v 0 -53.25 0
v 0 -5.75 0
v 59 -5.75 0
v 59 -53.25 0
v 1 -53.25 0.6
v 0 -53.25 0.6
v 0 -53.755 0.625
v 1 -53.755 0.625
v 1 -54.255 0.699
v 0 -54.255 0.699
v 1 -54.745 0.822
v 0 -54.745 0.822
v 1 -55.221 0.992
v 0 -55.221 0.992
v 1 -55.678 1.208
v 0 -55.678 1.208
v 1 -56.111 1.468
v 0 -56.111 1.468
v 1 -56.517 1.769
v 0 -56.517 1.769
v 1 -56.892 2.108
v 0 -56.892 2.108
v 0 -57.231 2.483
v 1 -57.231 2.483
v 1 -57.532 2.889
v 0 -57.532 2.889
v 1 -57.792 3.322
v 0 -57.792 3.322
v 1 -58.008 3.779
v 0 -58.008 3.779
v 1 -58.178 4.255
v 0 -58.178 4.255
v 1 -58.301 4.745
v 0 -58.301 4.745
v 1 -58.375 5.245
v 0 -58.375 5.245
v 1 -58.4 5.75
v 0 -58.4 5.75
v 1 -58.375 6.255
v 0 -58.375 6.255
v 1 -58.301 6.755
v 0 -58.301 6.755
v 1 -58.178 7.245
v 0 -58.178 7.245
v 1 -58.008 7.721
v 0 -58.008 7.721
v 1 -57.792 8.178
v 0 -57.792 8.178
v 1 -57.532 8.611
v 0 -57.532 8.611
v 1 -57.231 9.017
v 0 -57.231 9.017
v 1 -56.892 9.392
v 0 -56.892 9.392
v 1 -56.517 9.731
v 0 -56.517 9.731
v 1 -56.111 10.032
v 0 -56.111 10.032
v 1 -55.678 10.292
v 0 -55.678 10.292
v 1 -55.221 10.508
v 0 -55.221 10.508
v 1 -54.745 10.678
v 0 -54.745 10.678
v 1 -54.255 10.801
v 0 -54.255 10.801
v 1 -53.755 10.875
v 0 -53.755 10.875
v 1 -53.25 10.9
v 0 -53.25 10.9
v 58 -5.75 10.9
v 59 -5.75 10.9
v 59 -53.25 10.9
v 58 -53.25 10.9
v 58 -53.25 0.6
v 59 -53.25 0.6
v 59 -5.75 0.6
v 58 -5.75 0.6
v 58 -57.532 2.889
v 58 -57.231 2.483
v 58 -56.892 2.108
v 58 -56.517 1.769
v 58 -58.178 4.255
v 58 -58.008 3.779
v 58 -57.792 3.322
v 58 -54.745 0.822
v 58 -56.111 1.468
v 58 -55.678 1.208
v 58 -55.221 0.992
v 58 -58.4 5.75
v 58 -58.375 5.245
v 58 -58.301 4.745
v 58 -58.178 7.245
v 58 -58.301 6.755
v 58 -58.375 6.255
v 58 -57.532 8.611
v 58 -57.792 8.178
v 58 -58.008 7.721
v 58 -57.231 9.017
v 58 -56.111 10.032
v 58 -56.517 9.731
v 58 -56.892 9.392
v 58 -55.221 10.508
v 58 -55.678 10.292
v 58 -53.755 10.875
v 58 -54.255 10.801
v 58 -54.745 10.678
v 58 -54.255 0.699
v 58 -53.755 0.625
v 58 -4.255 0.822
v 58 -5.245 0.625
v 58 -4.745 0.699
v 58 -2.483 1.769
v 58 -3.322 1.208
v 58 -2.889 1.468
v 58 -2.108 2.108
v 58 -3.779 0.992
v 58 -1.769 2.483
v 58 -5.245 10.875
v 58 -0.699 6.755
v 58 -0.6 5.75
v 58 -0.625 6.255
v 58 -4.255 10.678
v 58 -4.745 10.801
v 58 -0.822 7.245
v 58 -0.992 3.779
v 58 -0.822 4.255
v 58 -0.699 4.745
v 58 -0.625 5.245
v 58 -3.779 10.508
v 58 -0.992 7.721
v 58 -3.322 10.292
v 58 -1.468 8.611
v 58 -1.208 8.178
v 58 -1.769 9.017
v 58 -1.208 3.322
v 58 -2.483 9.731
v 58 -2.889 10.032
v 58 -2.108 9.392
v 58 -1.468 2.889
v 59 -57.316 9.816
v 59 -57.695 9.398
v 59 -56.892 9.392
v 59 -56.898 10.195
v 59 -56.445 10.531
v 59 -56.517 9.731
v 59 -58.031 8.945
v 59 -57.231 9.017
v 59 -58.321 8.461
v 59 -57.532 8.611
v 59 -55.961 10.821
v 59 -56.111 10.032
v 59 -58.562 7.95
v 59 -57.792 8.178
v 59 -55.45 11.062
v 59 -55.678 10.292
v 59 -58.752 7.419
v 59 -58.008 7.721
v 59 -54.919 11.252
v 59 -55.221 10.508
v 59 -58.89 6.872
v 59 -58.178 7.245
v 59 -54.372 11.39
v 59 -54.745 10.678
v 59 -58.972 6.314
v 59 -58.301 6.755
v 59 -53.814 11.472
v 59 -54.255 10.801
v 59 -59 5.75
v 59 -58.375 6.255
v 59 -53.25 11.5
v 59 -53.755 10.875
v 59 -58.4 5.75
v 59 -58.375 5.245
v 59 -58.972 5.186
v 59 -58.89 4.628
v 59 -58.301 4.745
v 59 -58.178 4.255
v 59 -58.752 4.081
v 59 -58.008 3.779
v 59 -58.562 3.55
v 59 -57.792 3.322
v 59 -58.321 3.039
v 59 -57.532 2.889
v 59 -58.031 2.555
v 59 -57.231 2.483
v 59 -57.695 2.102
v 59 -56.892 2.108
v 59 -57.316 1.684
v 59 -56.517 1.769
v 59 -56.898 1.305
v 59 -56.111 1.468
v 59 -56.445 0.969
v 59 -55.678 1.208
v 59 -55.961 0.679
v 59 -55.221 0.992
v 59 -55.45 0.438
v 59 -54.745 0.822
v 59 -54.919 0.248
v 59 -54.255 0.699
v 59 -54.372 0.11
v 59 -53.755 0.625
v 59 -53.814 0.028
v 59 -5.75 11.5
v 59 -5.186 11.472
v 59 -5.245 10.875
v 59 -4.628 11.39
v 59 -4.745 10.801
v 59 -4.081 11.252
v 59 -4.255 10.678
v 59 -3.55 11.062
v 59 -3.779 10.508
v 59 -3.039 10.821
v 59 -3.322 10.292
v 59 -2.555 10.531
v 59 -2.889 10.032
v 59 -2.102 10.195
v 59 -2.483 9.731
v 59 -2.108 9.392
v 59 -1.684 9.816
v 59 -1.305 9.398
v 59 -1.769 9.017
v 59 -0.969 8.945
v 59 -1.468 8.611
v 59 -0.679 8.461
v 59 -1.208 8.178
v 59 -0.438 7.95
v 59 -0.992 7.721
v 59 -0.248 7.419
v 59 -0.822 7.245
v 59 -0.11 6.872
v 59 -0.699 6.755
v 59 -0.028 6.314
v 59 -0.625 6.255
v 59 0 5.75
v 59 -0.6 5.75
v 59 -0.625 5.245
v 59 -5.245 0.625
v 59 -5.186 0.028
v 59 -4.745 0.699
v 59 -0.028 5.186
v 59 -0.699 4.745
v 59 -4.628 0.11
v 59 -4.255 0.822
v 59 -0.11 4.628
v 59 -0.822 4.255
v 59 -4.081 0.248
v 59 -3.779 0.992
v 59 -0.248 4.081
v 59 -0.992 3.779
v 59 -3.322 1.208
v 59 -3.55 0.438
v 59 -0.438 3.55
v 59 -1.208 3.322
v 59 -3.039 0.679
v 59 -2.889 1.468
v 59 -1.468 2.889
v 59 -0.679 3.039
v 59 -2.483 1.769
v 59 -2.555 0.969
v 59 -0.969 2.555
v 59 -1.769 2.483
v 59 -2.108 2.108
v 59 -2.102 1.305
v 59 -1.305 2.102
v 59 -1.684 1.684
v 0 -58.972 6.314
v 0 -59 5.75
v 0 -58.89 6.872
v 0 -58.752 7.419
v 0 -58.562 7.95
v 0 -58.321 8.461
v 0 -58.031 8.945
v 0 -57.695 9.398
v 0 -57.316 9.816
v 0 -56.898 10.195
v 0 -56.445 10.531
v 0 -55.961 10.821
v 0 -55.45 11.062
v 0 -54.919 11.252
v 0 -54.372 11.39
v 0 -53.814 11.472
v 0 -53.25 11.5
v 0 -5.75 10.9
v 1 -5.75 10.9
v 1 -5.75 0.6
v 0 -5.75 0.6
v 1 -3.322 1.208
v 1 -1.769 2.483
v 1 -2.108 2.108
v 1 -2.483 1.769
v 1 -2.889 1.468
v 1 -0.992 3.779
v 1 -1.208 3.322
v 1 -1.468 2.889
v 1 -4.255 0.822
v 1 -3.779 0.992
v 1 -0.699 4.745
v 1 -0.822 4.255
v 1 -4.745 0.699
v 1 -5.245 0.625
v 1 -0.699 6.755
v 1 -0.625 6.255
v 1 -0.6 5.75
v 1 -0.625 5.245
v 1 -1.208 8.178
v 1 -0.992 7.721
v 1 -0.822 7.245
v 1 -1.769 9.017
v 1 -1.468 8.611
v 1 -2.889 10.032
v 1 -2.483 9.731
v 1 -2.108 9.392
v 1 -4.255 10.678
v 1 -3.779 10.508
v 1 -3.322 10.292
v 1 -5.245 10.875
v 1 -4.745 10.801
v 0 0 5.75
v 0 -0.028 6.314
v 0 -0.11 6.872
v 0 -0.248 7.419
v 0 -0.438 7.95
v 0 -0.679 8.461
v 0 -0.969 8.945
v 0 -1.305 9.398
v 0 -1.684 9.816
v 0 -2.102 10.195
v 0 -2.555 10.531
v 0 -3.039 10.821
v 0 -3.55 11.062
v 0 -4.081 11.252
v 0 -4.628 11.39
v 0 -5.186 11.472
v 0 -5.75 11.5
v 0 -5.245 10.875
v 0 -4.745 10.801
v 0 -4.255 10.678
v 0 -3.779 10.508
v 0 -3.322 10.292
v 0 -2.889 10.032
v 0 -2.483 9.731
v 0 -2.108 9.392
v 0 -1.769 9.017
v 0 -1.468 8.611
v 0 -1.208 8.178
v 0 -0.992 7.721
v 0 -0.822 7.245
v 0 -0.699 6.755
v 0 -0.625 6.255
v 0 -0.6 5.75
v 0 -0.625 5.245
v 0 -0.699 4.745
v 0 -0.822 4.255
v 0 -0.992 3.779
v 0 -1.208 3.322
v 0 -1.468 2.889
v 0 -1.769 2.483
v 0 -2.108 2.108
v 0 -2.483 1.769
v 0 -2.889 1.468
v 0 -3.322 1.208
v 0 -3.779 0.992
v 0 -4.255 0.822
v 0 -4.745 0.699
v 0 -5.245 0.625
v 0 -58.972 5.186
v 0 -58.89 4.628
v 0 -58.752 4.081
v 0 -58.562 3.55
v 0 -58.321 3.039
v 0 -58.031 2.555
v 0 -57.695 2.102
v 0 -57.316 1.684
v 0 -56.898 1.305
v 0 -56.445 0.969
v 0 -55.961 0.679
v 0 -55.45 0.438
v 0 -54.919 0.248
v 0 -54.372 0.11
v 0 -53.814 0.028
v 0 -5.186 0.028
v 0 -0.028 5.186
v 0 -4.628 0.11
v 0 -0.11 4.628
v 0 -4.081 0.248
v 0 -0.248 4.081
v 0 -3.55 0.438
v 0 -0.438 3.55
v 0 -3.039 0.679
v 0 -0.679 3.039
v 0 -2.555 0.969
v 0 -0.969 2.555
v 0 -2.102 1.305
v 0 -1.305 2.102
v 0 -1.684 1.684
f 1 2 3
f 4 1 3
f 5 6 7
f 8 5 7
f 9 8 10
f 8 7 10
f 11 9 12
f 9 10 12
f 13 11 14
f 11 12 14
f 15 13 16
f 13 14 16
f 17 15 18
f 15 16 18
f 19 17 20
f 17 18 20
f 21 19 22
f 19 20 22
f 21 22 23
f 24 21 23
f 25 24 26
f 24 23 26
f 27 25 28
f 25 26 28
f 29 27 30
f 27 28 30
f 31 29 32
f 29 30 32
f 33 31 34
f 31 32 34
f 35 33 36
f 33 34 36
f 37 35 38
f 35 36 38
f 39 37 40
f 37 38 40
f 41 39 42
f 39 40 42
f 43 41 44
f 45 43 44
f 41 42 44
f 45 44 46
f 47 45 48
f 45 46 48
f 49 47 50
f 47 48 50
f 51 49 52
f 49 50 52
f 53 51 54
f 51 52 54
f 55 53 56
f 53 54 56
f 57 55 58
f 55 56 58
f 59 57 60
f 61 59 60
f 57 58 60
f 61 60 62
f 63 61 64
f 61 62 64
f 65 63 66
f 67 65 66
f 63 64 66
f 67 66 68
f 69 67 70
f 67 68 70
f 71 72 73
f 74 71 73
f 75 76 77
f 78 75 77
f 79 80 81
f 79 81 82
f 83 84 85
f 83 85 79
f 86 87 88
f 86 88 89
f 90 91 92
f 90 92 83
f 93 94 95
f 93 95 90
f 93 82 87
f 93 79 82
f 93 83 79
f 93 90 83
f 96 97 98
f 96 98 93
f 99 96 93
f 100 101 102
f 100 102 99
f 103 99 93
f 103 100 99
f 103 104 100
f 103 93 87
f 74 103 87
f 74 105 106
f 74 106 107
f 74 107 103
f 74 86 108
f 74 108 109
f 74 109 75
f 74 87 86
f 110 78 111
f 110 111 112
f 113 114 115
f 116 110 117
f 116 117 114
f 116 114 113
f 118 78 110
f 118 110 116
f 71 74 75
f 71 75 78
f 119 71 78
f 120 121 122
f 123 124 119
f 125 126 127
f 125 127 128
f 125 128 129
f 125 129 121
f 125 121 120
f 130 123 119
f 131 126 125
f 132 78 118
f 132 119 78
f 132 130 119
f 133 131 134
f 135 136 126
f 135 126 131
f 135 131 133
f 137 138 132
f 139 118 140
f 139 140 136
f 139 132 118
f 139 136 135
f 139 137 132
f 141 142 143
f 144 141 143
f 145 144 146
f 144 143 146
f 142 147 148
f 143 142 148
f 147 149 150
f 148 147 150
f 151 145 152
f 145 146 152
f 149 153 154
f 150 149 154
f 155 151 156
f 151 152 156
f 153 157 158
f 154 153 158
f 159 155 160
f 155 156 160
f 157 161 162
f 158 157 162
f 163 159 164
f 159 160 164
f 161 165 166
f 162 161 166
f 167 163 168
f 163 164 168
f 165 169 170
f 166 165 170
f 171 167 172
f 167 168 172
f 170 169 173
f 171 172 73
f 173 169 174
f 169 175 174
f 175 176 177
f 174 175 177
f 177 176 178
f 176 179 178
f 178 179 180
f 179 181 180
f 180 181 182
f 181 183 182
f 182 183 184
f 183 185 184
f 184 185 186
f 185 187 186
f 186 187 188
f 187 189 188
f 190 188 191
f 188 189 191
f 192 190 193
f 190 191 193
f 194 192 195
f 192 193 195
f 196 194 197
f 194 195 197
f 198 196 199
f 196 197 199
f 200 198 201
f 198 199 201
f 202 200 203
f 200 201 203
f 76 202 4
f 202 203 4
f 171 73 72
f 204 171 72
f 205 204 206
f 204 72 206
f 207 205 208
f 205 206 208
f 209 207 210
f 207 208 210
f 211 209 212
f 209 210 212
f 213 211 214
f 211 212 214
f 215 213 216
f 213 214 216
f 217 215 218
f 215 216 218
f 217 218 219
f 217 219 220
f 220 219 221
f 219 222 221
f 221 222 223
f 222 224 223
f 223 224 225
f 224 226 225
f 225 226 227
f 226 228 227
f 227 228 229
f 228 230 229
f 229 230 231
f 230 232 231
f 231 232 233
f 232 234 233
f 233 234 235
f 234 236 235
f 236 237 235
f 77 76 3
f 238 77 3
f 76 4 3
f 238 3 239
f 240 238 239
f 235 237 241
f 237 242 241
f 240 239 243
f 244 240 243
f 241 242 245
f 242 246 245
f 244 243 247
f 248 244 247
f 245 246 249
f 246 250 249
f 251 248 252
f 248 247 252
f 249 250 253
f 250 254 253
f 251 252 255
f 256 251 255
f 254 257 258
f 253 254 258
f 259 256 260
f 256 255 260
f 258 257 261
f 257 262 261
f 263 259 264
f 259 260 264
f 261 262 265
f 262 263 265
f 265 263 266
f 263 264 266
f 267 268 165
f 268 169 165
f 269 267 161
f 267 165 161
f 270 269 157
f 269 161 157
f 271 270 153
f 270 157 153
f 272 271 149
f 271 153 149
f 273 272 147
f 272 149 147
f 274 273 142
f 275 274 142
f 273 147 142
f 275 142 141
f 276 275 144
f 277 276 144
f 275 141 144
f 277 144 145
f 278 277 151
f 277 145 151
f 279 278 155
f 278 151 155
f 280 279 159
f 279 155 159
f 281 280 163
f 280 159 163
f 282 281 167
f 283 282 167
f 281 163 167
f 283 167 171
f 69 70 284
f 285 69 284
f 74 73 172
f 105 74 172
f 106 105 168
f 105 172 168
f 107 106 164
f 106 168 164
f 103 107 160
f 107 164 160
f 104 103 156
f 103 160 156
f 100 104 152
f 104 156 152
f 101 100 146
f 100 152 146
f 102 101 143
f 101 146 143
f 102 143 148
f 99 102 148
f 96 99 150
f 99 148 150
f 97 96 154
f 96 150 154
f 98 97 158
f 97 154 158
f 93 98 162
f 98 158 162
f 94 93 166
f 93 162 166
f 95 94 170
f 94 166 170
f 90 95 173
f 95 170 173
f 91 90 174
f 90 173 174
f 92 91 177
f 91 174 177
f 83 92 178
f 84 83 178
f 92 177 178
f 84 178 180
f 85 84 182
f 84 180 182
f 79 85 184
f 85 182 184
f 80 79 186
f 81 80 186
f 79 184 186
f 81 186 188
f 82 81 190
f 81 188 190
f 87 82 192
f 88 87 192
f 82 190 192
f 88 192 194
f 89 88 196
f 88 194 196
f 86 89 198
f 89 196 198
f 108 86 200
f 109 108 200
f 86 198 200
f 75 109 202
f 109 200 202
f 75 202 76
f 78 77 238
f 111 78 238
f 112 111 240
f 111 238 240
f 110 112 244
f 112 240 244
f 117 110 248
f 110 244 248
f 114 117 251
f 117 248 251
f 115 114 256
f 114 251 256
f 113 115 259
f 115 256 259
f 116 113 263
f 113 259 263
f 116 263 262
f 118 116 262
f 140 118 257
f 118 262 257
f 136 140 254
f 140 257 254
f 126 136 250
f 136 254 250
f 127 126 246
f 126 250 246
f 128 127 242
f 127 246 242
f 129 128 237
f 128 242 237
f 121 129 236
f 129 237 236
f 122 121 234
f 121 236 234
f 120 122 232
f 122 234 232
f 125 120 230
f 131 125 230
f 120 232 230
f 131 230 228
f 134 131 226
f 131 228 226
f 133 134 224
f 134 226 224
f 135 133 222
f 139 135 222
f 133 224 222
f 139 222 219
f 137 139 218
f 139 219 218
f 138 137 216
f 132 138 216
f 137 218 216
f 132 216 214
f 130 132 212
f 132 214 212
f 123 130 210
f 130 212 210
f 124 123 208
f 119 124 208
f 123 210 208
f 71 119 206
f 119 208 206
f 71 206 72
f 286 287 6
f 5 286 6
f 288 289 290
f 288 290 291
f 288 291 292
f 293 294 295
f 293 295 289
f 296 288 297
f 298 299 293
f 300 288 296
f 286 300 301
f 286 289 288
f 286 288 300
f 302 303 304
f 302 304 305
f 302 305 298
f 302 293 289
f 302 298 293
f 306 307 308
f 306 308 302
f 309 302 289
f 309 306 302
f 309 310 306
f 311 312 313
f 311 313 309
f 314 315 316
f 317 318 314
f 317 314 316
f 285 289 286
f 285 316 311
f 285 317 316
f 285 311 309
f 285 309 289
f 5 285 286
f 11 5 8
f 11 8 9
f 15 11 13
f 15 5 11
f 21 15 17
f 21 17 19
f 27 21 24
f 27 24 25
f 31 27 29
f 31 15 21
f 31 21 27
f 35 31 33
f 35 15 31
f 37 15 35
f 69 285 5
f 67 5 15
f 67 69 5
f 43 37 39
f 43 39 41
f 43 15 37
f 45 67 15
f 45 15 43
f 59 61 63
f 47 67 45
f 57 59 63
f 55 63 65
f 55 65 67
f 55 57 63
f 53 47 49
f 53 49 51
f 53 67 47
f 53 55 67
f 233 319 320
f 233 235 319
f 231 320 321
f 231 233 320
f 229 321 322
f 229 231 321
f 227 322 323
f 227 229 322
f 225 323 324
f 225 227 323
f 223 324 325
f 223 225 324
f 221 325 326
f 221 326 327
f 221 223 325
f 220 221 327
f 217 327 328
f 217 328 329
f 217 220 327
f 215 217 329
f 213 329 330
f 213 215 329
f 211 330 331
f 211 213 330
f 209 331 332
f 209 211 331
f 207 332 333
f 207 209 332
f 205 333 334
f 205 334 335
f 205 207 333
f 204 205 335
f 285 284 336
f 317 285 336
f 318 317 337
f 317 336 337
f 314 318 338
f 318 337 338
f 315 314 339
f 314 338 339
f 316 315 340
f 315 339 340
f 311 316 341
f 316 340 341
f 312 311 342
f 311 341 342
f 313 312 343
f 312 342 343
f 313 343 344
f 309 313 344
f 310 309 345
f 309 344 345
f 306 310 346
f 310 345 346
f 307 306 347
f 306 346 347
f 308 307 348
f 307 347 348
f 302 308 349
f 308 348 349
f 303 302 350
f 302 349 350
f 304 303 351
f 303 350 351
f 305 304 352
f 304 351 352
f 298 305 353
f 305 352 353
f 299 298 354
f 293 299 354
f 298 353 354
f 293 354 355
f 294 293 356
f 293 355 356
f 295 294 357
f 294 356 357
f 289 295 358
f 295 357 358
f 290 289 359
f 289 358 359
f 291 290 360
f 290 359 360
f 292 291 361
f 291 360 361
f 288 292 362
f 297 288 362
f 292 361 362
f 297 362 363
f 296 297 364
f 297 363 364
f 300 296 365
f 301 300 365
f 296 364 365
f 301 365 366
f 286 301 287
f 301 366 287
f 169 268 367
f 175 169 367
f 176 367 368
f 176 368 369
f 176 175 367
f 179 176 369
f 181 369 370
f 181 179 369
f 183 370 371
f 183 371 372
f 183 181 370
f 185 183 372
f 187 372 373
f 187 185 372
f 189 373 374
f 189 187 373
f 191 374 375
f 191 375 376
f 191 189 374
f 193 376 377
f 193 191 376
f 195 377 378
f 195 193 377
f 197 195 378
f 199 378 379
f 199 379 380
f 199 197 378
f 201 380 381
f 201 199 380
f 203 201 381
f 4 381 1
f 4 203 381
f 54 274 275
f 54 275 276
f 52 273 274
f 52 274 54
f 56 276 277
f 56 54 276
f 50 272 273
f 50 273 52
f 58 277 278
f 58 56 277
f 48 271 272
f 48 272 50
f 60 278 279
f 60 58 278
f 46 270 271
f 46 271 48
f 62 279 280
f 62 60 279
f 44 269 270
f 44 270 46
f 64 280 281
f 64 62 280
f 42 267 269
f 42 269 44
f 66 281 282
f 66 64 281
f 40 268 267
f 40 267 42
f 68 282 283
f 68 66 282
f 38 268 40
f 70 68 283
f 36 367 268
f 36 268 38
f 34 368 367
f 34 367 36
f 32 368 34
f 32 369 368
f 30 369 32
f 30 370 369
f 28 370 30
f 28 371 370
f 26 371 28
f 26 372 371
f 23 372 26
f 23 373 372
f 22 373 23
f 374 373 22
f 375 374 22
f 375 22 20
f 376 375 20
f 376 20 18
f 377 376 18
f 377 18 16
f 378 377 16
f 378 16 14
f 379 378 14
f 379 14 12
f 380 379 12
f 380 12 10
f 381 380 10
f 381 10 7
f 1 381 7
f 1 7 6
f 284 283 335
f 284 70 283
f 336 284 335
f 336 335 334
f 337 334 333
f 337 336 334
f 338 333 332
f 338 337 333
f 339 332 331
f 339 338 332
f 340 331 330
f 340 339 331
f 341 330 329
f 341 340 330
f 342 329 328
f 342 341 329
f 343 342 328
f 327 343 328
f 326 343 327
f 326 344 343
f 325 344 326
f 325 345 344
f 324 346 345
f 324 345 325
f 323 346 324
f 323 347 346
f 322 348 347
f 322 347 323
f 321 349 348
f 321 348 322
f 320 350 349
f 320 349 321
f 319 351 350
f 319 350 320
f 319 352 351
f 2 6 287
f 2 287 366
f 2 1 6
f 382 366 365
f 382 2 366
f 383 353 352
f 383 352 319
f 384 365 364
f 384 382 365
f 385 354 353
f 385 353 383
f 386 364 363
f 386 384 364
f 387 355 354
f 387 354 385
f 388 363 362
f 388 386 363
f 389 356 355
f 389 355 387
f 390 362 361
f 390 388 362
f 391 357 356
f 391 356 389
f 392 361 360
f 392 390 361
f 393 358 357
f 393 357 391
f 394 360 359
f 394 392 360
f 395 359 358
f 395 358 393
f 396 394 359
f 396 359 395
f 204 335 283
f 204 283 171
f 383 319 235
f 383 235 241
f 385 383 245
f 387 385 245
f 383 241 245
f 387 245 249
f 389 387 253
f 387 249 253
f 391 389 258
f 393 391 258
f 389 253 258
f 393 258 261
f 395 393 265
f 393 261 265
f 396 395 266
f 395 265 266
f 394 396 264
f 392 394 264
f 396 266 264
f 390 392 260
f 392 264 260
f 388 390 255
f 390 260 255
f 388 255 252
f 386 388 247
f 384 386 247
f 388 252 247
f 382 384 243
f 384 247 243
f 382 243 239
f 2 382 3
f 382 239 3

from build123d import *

# Parameters (mm, degrees)
F0_W     = 59
F0_H     = 59
F1_DEPTH = 11.5
F2_R     = 5.74999
F4_DEPTH = 1
F6_DEPTH = 1


# Not quite as in the source:
# - a fillet or chamfer is up to 0.001 mm smaller than in the source, because OpenCascade refuses the exact size


with BuildPart() as f1:
    # F0 (on Top) → F1 (new body)
    with BuildSketch(Plane.XY):
        with Locations((29.5, -29.5)):
            Rectangle(F0_W, F0_H)
    extrude(amount=F1_DEPTH)

    # F2 (radius 5.75 in the source; OpenCascade refuses exactly that, so slightly less here)
    f2_edges = [f1.edges().sort_by_distance(p)[0] for p in [
        (29.5, -59, 11.5),
        (29.5, -59, 0),
        (29.5, 0, 11.5),
        (29.5, 0, 0),
    ]]
    fillet(f2_edges, radius=F2_R)

    # F3 (on face) → F4 (cut)
    with BuildSketch(Plane.YZ.offset(59)):
        with BuildLine():
            ThreePointArc((-5.75, 0.5999998897), (-0.5999998897, 5.75), (-5.75, 10.9000001103))
            Line((-5.75, 10.9000001103), (-53.25, 10.9000001103))
            ThreePointArc((-53.25, 10.9000001103), (-58.4000001103, 5.75), (-53.25, 0.5999998897))
            Line((-53.25, 0.5999998897), (-5.75, 0.5999998897))
        make_face()
    extrude(amount=-F4_DEPTH, mode=Mode.SUBTRACT)

    # F5 (on face) → F6 (cut)
    with BuildSketch(Plane(origin=(0, 0, 0), x_dir=(0, -1, 0), z_dir=(-1, 0, 0))):
        with BuildLine():
            Line((53.25, 10.9), (5.75, 10.9))
            ThreePointArc((5.75, 10.9), (0.6, 5.75), (5.75, 0.6))
            Line((5.75, 0.6), (53.25, 0.6))
            ThreePointArc((53.25, 0.6), (58.4, 5.75), (53.25, 10.9))
        make_face()
    extrude(amount=-F6_DEPTH, mode=Mode.SUBTRACT)


solid = f1.part
